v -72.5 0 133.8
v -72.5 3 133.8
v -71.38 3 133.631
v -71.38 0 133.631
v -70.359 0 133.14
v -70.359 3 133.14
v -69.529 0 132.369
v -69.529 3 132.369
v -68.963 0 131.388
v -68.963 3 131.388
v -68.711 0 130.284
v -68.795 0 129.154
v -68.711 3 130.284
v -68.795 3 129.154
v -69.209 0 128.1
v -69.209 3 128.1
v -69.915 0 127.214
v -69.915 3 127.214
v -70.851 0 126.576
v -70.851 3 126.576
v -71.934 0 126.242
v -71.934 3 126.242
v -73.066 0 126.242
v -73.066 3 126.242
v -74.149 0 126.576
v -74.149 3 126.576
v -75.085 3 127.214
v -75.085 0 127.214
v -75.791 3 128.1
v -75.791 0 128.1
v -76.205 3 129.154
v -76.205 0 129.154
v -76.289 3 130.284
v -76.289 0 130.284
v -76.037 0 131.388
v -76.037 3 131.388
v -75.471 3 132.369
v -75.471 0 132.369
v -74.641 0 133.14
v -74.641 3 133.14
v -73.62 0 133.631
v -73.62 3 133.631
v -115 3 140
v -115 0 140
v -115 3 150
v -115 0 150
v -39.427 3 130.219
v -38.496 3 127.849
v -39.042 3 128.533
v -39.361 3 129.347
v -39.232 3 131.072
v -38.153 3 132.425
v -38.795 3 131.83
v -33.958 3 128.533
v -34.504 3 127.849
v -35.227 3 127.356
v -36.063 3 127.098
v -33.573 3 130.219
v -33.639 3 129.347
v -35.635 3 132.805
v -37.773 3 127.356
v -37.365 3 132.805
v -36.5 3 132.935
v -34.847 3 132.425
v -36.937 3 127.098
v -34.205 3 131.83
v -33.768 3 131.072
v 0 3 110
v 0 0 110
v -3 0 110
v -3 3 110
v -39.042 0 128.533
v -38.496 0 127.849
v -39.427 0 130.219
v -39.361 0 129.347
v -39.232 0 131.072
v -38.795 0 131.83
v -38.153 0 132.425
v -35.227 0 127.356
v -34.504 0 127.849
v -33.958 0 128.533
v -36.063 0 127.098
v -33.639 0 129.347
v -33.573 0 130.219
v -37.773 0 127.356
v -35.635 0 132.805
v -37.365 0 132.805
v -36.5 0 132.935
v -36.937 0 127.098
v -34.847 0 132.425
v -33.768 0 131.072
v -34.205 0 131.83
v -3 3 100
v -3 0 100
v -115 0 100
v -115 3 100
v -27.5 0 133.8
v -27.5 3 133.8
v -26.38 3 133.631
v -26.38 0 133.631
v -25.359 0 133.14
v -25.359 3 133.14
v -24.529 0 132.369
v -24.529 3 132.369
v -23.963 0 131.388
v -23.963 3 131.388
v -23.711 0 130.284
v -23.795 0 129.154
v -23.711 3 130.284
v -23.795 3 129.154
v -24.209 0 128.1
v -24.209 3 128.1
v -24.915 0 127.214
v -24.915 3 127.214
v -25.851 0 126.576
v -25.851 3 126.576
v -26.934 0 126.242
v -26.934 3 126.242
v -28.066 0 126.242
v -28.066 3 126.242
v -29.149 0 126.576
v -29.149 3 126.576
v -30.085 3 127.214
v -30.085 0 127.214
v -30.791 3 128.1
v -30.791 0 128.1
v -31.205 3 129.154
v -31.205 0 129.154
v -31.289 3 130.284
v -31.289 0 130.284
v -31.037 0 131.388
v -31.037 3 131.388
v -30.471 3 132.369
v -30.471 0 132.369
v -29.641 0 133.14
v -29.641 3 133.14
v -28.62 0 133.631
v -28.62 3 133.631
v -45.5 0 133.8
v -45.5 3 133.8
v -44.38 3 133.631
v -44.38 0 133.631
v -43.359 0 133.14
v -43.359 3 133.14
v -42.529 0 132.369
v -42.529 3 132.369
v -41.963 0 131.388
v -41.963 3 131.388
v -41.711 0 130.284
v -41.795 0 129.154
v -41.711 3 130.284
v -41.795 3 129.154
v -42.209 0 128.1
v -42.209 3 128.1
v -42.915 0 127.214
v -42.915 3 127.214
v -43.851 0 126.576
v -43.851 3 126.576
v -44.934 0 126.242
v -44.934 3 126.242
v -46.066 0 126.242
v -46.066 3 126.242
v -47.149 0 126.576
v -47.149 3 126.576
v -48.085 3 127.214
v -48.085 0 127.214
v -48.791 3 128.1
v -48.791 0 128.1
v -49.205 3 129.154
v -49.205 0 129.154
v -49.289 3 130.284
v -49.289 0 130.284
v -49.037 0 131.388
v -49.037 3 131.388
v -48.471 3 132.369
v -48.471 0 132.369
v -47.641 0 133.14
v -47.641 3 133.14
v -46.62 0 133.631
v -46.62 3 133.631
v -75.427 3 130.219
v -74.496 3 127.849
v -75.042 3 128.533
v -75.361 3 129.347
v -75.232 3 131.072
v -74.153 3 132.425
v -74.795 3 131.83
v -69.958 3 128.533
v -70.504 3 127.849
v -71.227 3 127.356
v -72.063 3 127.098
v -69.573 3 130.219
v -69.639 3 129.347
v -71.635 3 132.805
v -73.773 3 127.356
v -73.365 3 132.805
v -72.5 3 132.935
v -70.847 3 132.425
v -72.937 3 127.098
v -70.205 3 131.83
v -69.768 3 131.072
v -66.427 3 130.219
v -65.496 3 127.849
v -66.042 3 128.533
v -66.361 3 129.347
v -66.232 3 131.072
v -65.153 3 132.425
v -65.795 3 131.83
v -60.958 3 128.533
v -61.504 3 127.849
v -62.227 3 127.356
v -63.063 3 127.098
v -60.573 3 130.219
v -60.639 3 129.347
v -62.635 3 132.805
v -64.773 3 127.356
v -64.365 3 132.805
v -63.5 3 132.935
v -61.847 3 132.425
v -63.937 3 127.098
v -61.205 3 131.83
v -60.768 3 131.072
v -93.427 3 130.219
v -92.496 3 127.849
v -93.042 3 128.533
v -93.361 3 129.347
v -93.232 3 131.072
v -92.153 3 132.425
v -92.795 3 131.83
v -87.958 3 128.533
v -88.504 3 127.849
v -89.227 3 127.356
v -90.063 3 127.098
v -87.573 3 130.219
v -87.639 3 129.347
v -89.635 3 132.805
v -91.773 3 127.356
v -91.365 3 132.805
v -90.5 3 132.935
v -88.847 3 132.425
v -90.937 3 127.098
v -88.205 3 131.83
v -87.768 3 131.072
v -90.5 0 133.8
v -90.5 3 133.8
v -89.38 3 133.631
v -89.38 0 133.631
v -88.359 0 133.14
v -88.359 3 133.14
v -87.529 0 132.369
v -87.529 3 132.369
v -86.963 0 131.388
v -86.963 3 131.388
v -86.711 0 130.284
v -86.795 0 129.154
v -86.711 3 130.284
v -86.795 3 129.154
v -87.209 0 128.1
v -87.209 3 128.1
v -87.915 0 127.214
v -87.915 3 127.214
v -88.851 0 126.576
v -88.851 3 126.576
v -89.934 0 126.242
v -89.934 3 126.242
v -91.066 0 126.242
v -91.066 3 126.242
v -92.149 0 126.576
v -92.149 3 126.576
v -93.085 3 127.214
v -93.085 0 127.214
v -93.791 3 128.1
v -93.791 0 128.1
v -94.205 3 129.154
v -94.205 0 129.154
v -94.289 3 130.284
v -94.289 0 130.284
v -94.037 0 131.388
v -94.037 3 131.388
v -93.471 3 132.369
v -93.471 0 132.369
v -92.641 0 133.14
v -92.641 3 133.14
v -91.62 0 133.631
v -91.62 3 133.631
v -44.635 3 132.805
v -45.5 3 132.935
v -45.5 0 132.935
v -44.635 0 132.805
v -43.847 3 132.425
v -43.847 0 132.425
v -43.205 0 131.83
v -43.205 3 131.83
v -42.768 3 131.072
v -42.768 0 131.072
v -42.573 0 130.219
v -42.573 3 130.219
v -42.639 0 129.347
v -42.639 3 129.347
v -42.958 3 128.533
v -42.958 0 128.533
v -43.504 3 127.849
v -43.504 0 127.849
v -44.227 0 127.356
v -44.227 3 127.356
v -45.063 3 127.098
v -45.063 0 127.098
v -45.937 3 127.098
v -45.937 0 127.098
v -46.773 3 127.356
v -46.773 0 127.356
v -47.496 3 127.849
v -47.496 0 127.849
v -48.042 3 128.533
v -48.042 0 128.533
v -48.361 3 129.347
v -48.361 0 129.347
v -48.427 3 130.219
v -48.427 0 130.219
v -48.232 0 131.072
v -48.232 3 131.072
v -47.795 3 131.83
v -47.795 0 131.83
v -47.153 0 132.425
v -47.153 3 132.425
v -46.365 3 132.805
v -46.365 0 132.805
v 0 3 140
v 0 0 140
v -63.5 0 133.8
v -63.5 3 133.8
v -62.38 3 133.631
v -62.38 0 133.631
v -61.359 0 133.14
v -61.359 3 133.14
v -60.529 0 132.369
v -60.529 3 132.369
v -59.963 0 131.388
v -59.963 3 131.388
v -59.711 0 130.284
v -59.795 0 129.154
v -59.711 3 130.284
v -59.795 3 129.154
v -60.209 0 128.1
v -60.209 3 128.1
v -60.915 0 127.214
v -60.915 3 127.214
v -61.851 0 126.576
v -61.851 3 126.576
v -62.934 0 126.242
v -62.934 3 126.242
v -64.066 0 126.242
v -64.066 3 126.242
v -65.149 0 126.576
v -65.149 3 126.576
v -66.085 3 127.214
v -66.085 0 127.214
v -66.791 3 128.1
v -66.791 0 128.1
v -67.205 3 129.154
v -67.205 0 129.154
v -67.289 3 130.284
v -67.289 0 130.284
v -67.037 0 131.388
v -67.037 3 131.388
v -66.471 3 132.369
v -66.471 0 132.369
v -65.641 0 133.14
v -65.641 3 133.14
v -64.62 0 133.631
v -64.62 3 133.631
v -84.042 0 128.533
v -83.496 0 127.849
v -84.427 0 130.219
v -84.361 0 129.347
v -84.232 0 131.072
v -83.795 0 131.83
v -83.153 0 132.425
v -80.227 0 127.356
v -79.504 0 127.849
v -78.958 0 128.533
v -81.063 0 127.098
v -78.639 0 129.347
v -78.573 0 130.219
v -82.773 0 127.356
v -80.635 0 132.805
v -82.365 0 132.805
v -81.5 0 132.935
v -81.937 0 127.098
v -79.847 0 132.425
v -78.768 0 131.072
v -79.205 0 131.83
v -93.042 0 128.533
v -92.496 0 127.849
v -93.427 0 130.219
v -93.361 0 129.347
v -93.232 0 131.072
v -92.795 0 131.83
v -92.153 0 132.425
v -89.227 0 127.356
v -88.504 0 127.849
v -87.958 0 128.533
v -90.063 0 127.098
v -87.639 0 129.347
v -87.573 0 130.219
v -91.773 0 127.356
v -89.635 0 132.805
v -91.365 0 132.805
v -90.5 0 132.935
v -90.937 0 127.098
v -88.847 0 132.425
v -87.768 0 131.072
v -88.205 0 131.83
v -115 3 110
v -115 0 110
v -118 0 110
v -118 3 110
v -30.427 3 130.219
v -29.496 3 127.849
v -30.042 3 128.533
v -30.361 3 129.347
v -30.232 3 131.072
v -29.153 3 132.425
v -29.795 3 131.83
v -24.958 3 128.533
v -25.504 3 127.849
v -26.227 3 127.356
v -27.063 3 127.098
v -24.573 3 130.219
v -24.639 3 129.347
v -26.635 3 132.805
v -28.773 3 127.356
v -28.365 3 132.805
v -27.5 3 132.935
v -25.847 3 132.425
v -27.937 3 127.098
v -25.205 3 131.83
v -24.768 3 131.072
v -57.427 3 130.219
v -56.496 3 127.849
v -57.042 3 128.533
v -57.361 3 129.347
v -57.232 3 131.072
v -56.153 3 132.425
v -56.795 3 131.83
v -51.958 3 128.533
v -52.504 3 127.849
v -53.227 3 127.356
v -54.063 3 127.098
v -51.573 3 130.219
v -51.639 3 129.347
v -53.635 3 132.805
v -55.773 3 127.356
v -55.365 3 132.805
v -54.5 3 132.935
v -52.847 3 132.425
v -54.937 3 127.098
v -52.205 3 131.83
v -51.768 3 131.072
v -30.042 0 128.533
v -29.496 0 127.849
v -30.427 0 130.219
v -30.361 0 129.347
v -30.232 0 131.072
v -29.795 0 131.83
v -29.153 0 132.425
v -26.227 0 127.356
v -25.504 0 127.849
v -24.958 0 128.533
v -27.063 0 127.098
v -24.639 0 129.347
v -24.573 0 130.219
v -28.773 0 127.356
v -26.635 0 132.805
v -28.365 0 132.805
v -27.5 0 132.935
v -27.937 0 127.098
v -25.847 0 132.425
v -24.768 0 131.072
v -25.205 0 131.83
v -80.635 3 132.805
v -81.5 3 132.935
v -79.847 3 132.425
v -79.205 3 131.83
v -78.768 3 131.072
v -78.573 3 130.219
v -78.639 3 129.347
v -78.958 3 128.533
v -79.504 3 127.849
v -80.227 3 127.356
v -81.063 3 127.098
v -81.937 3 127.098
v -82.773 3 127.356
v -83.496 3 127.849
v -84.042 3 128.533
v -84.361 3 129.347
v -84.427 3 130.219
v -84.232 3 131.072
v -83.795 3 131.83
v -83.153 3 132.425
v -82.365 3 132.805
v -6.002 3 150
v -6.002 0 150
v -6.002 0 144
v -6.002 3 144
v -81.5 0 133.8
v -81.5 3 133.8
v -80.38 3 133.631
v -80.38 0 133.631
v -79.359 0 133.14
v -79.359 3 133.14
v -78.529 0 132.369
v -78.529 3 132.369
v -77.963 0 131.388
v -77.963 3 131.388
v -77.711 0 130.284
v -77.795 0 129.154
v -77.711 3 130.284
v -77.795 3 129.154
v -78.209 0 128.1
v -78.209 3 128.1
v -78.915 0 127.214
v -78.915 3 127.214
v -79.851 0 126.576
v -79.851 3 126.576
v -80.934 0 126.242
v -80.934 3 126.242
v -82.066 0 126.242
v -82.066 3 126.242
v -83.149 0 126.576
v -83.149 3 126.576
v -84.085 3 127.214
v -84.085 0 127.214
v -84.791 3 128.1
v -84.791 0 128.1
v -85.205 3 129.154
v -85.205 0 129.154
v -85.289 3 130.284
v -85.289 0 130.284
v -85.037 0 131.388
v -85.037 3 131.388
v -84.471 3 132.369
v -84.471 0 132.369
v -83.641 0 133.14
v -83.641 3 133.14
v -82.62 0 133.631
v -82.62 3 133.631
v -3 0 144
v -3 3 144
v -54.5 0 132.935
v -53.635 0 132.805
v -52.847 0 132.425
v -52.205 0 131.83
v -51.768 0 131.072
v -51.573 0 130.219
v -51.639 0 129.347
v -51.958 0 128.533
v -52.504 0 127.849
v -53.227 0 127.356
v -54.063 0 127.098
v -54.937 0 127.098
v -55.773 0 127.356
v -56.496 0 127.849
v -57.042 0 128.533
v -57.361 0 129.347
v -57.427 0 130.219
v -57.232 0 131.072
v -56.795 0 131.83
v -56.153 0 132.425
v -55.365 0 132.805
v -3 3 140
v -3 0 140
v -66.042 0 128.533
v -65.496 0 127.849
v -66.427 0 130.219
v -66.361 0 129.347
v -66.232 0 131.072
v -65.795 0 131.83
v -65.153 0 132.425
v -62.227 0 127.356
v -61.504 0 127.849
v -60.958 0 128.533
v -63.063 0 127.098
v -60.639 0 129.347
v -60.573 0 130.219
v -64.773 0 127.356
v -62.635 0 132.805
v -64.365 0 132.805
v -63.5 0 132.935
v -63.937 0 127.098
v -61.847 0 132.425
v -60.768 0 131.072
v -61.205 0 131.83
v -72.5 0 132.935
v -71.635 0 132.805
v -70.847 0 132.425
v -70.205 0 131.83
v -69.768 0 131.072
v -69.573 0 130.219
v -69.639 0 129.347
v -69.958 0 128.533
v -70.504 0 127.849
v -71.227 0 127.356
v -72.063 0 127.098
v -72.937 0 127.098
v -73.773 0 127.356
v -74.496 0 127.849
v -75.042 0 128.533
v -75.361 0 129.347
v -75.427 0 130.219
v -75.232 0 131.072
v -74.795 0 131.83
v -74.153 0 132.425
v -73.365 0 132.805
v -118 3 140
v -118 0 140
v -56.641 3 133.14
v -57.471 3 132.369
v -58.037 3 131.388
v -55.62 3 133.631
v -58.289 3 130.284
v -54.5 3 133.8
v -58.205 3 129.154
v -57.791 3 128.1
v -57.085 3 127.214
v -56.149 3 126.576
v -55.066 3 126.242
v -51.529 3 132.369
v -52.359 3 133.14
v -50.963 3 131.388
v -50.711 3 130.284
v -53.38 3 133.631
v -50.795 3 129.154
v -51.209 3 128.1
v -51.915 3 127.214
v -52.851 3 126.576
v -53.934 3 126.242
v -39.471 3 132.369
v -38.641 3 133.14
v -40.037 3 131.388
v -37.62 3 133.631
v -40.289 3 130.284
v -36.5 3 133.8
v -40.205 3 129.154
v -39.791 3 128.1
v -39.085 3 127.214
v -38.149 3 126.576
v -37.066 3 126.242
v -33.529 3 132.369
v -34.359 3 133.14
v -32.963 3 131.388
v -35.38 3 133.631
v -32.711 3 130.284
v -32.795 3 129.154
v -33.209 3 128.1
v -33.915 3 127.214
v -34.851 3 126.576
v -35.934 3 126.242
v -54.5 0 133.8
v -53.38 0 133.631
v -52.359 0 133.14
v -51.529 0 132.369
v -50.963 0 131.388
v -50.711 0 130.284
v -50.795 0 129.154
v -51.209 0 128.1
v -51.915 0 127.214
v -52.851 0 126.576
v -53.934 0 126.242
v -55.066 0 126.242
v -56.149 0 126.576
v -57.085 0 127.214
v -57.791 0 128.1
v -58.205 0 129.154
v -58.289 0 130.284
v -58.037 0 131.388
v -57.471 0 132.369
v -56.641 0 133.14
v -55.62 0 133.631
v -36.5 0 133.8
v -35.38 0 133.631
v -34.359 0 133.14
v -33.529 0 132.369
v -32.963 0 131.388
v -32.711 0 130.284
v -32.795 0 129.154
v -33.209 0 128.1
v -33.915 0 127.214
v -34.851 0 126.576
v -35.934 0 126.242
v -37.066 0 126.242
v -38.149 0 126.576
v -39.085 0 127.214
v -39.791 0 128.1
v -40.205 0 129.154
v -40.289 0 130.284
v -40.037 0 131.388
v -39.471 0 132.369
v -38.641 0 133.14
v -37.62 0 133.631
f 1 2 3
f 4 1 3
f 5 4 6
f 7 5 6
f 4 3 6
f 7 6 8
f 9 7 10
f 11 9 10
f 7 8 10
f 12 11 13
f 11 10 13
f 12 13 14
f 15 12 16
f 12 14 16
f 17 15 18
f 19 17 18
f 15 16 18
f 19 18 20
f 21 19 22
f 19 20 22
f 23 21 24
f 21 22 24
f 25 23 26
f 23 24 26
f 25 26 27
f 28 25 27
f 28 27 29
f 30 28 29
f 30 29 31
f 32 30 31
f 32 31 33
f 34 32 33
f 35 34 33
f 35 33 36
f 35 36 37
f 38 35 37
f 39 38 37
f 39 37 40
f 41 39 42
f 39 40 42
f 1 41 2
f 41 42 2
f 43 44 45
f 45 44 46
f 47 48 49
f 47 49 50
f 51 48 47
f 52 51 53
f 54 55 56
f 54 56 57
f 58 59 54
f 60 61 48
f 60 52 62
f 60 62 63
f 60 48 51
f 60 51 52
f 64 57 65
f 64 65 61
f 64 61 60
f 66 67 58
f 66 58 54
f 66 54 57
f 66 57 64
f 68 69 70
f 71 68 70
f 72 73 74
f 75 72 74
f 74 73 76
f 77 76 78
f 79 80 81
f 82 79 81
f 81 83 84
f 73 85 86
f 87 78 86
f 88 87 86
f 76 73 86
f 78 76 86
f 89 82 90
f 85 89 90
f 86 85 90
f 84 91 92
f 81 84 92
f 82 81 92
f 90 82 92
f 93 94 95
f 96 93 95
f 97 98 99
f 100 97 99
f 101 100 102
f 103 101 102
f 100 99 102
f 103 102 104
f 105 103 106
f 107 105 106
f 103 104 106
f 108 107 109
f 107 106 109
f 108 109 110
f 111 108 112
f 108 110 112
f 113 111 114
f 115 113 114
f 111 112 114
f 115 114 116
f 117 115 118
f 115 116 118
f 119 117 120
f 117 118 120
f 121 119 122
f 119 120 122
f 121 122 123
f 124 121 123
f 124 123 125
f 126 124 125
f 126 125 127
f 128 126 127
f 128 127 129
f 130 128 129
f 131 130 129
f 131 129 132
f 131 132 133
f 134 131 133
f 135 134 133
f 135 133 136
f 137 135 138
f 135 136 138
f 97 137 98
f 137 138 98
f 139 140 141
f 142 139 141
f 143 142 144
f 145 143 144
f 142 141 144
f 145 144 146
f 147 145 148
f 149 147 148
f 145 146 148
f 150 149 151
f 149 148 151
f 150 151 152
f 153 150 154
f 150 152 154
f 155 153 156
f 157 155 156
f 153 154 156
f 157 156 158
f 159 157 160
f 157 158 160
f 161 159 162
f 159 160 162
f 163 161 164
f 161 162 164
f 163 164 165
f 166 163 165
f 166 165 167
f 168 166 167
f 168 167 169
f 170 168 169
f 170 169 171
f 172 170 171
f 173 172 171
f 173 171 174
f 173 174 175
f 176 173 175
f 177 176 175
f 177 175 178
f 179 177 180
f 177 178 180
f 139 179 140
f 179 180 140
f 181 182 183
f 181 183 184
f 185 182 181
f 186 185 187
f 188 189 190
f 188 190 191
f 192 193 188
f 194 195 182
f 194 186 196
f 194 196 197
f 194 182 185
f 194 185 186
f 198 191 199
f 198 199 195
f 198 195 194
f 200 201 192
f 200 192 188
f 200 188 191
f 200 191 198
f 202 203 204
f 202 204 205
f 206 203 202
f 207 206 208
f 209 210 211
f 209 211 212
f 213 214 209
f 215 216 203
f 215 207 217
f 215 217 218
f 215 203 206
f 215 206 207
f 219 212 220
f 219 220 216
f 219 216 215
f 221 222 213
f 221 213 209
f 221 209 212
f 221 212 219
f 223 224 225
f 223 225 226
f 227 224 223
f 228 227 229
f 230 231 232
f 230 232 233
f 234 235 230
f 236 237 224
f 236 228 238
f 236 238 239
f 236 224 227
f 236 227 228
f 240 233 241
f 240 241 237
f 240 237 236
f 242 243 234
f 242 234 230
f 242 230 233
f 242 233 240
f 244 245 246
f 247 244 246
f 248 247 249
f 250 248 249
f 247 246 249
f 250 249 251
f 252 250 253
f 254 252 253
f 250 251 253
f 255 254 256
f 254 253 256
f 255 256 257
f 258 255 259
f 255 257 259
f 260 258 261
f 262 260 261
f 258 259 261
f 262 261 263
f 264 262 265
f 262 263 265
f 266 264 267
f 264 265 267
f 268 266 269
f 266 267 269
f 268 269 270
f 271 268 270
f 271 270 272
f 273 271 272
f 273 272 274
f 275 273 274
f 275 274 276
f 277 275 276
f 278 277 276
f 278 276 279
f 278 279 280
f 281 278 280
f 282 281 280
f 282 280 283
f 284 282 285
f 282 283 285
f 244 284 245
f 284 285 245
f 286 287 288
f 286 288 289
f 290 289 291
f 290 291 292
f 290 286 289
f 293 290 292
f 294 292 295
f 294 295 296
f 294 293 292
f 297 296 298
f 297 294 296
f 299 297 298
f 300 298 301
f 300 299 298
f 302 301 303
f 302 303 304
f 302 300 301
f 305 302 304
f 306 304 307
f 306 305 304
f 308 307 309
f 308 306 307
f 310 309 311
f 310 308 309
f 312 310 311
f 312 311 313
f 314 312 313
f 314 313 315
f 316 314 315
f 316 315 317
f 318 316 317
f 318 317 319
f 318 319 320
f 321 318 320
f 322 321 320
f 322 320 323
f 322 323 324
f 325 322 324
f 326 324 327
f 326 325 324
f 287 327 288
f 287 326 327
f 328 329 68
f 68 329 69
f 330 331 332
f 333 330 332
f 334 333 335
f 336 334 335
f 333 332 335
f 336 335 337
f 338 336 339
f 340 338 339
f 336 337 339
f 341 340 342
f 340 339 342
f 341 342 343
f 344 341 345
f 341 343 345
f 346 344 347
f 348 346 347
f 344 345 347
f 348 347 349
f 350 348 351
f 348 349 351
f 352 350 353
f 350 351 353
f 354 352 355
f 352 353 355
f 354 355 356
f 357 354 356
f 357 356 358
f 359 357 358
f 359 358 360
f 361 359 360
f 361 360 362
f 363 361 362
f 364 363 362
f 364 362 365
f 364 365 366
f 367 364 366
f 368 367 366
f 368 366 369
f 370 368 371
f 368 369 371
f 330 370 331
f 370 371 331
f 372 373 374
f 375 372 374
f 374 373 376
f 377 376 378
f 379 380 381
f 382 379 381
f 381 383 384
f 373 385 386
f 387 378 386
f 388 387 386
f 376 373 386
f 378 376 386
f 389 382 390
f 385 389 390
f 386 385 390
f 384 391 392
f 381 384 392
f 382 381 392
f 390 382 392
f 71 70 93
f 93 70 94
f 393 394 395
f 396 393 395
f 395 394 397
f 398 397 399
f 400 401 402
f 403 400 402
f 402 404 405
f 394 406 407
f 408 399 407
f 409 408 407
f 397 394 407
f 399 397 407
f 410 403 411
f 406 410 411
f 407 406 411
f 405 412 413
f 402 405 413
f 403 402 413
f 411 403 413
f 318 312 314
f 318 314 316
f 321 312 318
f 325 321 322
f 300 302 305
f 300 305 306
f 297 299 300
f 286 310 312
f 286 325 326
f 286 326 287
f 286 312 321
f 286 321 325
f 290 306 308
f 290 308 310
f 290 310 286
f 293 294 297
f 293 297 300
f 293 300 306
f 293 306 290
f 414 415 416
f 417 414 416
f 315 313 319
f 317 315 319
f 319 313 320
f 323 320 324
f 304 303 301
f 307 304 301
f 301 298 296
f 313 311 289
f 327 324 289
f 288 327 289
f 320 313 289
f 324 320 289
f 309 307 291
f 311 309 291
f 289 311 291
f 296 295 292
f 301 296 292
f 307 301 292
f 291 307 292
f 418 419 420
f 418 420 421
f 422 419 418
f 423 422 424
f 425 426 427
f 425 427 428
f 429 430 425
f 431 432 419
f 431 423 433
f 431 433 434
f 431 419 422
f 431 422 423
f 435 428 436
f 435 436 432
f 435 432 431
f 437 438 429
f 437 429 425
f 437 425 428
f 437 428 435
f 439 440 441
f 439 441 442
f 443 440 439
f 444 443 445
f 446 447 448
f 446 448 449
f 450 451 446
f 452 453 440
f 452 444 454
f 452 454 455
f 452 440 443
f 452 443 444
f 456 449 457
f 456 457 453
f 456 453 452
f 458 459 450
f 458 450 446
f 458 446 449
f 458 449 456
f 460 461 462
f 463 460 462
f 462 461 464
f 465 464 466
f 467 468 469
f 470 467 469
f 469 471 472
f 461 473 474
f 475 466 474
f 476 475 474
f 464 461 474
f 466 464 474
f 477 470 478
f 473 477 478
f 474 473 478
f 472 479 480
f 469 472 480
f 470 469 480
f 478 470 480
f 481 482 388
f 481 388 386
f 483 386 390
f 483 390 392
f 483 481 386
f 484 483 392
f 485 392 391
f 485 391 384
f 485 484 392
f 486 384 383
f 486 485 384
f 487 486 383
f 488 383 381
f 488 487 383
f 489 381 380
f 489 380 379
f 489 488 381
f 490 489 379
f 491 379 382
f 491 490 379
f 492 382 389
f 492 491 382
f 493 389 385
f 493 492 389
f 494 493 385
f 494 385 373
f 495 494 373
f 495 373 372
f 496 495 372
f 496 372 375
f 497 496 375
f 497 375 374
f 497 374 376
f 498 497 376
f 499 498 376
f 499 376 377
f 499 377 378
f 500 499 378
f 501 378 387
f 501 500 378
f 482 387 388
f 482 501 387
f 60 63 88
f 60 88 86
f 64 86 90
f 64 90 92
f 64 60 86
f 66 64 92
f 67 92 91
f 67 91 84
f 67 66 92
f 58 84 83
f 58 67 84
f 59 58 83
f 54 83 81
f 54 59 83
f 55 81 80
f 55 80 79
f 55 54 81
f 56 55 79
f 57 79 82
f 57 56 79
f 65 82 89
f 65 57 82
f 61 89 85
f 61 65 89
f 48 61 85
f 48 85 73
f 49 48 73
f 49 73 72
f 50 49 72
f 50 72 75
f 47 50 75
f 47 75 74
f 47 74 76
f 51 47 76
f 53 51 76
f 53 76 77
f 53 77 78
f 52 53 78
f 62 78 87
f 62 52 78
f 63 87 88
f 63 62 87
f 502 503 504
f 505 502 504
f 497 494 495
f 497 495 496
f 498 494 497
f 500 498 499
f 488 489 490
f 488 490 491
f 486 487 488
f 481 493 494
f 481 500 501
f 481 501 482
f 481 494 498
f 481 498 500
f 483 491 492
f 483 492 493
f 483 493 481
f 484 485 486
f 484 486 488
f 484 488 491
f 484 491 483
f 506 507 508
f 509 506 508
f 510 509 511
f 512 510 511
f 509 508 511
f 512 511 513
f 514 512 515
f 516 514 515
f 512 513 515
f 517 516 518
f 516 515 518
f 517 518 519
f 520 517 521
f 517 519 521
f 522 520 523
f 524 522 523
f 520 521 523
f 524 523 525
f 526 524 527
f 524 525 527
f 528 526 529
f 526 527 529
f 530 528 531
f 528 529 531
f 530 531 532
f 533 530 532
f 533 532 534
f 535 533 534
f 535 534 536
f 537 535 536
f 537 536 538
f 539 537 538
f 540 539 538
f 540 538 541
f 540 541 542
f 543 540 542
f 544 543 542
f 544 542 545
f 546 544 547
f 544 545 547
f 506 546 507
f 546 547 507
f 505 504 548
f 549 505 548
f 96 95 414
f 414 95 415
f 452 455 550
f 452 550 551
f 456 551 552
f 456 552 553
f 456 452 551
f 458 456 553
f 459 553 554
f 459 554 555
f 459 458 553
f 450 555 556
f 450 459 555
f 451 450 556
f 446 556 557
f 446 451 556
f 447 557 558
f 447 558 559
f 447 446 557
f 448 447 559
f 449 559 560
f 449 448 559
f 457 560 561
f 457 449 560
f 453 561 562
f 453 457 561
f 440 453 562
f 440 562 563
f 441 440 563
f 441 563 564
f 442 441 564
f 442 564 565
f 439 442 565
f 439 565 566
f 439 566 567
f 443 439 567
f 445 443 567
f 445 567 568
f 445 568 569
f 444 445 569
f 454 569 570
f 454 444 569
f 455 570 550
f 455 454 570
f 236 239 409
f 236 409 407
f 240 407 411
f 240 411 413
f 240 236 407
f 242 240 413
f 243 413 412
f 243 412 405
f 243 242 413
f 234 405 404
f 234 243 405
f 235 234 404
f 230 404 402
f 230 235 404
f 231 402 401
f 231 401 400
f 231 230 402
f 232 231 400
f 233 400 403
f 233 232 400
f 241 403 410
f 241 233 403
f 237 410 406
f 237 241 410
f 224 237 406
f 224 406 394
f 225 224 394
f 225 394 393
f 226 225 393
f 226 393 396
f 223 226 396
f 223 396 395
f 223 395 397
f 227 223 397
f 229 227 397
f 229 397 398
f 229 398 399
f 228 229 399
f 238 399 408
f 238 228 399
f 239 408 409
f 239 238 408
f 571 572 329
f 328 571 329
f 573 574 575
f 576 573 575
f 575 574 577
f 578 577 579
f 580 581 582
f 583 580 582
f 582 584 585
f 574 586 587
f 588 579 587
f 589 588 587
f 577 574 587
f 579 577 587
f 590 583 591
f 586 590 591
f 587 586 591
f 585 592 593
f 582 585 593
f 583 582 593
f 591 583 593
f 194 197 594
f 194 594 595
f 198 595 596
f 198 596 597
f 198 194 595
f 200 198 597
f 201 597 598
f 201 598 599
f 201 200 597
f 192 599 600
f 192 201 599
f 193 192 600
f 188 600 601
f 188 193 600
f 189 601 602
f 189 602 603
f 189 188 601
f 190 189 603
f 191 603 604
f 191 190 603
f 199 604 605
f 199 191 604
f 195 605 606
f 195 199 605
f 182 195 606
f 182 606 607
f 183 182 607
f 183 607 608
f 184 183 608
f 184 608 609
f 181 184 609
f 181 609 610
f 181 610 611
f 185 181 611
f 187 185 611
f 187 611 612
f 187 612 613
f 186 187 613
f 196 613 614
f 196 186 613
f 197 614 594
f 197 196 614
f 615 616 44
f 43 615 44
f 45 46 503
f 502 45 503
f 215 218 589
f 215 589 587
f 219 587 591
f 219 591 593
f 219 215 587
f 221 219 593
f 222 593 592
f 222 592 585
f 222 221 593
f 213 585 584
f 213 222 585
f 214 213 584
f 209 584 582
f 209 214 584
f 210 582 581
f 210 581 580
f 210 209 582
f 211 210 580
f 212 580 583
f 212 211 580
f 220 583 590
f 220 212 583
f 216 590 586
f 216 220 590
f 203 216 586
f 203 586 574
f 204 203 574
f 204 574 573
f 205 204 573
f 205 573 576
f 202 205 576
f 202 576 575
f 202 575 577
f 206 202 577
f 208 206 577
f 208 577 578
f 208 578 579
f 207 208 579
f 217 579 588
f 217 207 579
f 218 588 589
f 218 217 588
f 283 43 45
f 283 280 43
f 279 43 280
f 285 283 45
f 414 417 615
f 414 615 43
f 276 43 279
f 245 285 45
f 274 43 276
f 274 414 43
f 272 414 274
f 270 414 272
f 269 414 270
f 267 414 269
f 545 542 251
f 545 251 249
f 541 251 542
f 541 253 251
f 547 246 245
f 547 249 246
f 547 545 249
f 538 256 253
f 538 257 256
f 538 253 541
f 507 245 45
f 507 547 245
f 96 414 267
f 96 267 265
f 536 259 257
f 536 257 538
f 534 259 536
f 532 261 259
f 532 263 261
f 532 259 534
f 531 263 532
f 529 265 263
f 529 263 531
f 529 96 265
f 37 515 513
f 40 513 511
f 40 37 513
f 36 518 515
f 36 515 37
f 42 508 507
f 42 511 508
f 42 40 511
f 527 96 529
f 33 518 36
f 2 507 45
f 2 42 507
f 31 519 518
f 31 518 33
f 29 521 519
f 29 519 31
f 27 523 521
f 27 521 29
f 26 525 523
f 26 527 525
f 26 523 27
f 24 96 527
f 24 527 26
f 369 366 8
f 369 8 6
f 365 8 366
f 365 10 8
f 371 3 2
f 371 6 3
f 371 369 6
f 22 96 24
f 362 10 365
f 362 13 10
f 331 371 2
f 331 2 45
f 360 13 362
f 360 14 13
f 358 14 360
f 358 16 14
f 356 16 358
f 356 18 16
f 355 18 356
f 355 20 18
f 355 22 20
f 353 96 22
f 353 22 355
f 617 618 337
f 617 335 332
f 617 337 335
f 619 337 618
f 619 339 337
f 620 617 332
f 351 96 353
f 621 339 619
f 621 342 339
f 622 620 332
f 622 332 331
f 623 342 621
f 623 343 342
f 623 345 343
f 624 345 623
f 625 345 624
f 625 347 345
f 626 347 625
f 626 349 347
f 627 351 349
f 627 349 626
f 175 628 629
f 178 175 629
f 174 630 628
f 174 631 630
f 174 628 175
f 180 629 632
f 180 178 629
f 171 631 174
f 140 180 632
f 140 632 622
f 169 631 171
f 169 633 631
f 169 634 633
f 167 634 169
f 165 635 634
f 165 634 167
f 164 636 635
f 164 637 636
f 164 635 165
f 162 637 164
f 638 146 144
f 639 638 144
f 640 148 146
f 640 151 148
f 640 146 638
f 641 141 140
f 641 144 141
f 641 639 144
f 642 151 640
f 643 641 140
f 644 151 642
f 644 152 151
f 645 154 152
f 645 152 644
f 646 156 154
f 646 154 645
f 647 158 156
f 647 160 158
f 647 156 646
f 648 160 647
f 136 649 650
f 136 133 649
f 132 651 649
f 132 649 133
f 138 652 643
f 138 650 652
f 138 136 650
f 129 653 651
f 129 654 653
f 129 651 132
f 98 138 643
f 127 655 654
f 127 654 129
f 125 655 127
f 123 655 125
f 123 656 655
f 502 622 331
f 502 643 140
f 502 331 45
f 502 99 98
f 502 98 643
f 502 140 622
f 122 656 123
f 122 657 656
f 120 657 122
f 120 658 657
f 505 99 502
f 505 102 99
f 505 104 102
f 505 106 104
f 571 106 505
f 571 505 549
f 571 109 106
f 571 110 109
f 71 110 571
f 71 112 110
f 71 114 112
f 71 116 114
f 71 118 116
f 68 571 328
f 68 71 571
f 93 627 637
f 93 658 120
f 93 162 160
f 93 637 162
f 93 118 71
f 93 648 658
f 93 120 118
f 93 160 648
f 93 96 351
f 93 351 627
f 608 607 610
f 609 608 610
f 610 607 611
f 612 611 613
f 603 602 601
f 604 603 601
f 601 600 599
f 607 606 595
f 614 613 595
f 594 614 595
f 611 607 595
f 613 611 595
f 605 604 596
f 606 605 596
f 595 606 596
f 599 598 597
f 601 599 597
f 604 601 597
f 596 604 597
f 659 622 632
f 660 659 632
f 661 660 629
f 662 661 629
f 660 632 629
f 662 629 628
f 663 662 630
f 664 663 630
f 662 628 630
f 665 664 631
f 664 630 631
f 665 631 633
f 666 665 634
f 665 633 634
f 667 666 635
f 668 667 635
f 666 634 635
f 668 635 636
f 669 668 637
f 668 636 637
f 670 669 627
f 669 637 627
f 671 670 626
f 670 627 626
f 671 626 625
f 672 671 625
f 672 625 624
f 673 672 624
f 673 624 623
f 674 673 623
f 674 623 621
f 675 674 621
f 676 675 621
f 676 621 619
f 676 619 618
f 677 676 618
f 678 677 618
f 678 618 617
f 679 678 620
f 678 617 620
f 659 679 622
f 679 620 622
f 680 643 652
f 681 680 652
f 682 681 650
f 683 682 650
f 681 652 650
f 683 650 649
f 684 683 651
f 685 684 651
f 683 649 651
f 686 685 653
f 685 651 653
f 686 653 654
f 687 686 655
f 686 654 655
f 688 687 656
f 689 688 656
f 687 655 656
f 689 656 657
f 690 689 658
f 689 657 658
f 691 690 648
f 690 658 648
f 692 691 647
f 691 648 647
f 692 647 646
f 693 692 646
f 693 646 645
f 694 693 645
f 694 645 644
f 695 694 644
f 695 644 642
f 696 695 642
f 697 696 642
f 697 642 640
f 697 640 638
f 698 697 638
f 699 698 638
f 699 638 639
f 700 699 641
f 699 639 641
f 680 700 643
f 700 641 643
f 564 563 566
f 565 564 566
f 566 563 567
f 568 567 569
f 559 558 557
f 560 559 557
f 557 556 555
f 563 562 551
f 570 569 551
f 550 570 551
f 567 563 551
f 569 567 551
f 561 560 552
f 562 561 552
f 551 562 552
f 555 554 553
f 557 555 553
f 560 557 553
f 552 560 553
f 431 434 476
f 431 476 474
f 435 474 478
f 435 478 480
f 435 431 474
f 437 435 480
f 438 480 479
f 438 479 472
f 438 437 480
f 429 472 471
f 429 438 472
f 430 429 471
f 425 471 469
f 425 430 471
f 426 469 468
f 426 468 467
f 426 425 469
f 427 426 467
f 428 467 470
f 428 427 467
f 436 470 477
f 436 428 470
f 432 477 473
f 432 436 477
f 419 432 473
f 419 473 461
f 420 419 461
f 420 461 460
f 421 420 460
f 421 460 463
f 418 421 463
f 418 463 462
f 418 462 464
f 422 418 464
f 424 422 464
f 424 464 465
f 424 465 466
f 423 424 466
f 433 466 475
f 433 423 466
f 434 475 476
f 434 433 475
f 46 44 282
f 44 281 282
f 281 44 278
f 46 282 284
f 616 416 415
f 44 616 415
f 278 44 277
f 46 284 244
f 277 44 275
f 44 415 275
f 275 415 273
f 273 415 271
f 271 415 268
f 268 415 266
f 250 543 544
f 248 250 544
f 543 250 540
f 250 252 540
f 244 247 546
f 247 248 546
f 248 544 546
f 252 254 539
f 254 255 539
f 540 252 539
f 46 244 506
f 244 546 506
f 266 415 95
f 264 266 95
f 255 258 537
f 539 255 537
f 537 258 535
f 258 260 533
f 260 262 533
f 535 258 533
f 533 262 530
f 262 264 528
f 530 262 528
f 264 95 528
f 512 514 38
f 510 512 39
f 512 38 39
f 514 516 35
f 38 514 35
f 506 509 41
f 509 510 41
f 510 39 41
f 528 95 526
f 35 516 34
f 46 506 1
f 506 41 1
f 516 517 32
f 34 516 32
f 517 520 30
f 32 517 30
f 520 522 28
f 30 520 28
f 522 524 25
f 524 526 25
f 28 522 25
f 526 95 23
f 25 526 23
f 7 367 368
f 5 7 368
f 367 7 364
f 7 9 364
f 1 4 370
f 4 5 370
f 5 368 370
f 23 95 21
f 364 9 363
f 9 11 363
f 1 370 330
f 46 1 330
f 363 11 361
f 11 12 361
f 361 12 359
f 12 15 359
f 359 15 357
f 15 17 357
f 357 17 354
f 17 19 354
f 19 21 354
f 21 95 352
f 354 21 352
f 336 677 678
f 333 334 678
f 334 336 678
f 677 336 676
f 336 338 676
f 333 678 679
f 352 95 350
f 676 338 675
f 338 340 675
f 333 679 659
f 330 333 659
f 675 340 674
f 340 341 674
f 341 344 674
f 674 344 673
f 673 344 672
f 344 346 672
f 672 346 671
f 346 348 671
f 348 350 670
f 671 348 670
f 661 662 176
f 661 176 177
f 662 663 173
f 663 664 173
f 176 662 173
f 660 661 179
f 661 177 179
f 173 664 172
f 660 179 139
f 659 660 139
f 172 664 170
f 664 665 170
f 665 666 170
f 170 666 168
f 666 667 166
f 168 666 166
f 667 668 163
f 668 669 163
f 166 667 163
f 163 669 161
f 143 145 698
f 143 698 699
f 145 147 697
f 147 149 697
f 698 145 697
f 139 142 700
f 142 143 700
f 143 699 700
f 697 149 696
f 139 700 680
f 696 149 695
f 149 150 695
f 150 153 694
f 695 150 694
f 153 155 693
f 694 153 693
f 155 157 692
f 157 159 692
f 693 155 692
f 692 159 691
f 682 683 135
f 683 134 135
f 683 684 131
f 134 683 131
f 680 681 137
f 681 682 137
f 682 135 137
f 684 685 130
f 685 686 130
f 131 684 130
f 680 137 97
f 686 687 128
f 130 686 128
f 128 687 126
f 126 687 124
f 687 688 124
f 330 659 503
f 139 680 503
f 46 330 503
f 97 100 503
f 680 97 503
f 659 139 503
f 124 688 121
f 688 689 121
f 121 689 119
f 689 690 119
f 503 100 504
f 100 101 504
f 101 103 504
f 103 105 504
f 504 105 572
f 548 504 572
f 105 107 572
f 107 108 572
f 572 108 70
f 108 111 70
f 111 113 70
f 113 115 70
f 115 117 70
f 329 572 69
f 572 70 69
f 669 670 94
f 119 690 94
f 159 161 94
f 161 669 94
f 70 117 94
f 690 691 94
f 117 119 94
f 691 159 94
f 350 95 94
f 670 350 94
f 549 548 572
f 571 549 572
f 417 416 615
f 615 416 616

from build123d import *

# Parameters (mm, degrees)
LED_1_OUTLINE_R     = 2.25
LED_1_DEPTH         = 3
SKETCH_1_R          = 3.8
CUT_EXTRUDE_1_DEPTH = 3
SKETCH_3_R          = 2.934909796
EXTRUDE_1_DEPTH     = 3
EXTRUDE_1_2_DEPTH   = 3
EXTRUDE_1_3_DEPTH   = 3
EXTRUDE_1_4_DEPTH   = 3
EXTRUDE_1_5_DEPTH   = 3
EXTRUDE_1_6_DEPTH   = 3
EXTRUDE_1_7_DEPTH   = 3
EXTRUDE_1_8_DEPTH   = 3


# Read off the part's stored shape, not the designer's step: 基体零件-LED板-1
with BuildPart() as part:
    # 基体零件-LED板-1 outline → 基体零件-LED板-1 (new body)
    with BuildSketch(Plane(origin=(0, 0, 0), x_dir=(1, 0, 0), z_dir=(0, 1, 0))):
        Polygon((-3, -140), (0, -140), (0, -110), (-3, -110), (-3, -100), (-115, -100), (-115, -110), (-118, -110), (-118, -140), (-115, -140), (-115, -150), (-6.001970153, -150), (-6.001970153, -144), (-3, -144), align=None)
        with Locations((-90.5, -130)):
            Circle(LED_1_OUTLINE_R, mode=Mode.SUBTRACT)
        with Locations((-81.5, -130)):
            Circle(LED_1_OUTLINE_R, mode=Mode.SUBTRACT)
        with Locations((-72.5, -130)):
            Circle(LED_1_OUTLINE_R, mode=Mode.SUBTRACT)
        with Locations((-63.5, -130)):
            Circle(LED_1_OUTLINE_R, mode=Mode.SUBTRACT)
        with Locations((-54.5, -130)):
            Circle(LED_1_OUTLINE_R, mode=Mode.SUBTRACT)
        with Locations((-45.5, -130)):
            Circle(LED_1_OUTLINE_R, mode=Mode.SUBTRACT)
        with Locations((-36.5, -130)):
            Circle(LED_1_OUTLINE_R, mode=Mode.SUBTRACT)
        with Locations((-27.5, -130)):
            Circle(LED_1_OUTLINE_R, mode=Mode.SUBTRACT)
    extrude(amount=LED_1_DEPTH)

    # 草图1 → 切除-拉伸1 (cut)
    with BuildSketch(Plane(origin=(0, 3, 0), x_dir=(1, 0, 0), z_dir=(0, 1, 0))):
        with Locations(Location((-90.5, -130, 0), (0, 0, 270))):
            Circle(SKETCH_1_R)
        with Locations(Location((-81.5, -130, 0), (0, 0, 270))):
            Circle(SKETCH_1_R)
        with Locations(Location((-72.5, -130, 0), (0, 0, 270))):
            Circle(SKETCH_1_R)
        with Locations(Location((-63.5, -130, 0), (0, 0, 270))):
            Circle(SKETCH_1_R)
        with Locations(Location((-54.5, -130, 0), (0, 0, 270))):
            Circle(SKETCH_1_R)
        with Locations(Location((-45.5, -130, 0), (0, 0, 270))):
            Circle(SKETCH_1_R)
        with Locations(Location((-36.5, -130, 0), (0, 0, 270))):
            Circle(SKETCH_1_R)
        with Locations(Location((-27.5, -130, 0), (0, 0, 270))):
            Circle(SKETCH_1_R)
    extrude(amount=-CUT_EXTRUDE_1_DEPTH, mode=Mode.SUBTRACT)


with BuildPart() as body_2:
    # 草图3 → 凸台-拉伸1 (new body)
    with BuildSketch(Plane(origin=(0, 3, 0), x_dir=(1, 0, 0), z_dir=(0, 1, 0))):
        with Locations(Location((-27.5, -130, 0), (0, 0, 270))):
            Circle(SKETCH_3_R)
    extrude(amount=-EXTRUDE_1_DEPTH)


with BuildPart() as body_3:
    # 草图3 → Extrude 1 2 (new body)
    with BuildSketch(Plane(origin=(0, 3, 0), x_dir=(1, 0, 0), z_dir=(0, 1, 0))):
        with Locations(Location((-36.5, -130, 0), (0, 0, 270))):
            Circle(SKETCH_3_R)
    extrude(amount=-EXTRUDE_1_2_DEPTH)


with BuildPart() as body_4:
    # 草图3 → Extrude 1 3 (new body)
    with BuildSketch(Plane(origin=(0, 3, 0), x_dir=(1, 0, 0), z_dir=(0, 1, 0))):
        with Locations(Location((-45.5, -130, 0), (0, 0, 270))):
            Circle(SKETCH_3_R)
    extrude(amount=-EXTRUDE_1_3_DEPTH)


with BuildPart() as body_5:
    # 草图3 → Extrude 1 4 (new body)
    with BuildSketch(Plane(origin=(0, 3, 0), x_dir=(1, 0, 0), z_dir=(0, 1, 0))):
        with Locations(Location((-54.5, -130, 0), (0, 0, 270))):
            Circle(SKETCH_3_R)
    extrude(amount=-EXTRUDE_1_4_DEPTH)


with BuildPart() as body_6:
    # 草图3 → Extrude 1 5 (new body)
    with BuildSketch(Plane(origin=(0, 3, 0), x_dir=(1, 0, 0), z_dir=(0, 1, 0))):
        with Locations(Location((-63.5, -130, 0), (0, 0, 270))):
            Circle(SKETCH_3_R)
    extrude(amount=-EXTRUDE_1_5_DEPTH)


with BuildPart() as body_7:
    # 草图3 → Extrude 1 6 (new body)
    with BuildSketch(Plane(origin=(0, 3, 0), x_dir=(1, 0, 0), z_dir=(0, 1, 0))):
        with Locations(Location((-72.5, -130, 0), (0, 0, 270))):
            Circle(SKETCH_3_R)
    extrude(amount=-EXTRUDE_1_6_DEPTH)


with BuildPart() as body_8:
    # 草图3 → Extrude 1 7 (new body)
    with BuildSketch(Plane(origin=(0, 3, 0), x_dir=(1, 0, 0), z_dir=(0, 1, 0))):
        with Locations(Location((-81.5, -130, 0), (0, 0, 270))):
            Circle(SKETCH_3_R)
    extrude(amount=-EXTRUDE_1_7_DEPTH)


with BuildPart() as body_9:
    # 草图3 → Extrude 1 8 (new body)
    with BuildSketch(Plane(origin=(0, 3, 0), x_dir=(1, 0, 0), z_dir=(0, 1, 0))):
        with Locations(Location((-90.5, -130, 0), (0, 0, 270))):
            Circle(SKETCH_3_R)
    extrude(amount=-EXTRUDE_1_8_DEPTH)


solid = Compound([part.part, body_2.part, body_3.part, body_4.part, body_5.part, body_6.part, body_7.part, body_8.part, body_9.part])
